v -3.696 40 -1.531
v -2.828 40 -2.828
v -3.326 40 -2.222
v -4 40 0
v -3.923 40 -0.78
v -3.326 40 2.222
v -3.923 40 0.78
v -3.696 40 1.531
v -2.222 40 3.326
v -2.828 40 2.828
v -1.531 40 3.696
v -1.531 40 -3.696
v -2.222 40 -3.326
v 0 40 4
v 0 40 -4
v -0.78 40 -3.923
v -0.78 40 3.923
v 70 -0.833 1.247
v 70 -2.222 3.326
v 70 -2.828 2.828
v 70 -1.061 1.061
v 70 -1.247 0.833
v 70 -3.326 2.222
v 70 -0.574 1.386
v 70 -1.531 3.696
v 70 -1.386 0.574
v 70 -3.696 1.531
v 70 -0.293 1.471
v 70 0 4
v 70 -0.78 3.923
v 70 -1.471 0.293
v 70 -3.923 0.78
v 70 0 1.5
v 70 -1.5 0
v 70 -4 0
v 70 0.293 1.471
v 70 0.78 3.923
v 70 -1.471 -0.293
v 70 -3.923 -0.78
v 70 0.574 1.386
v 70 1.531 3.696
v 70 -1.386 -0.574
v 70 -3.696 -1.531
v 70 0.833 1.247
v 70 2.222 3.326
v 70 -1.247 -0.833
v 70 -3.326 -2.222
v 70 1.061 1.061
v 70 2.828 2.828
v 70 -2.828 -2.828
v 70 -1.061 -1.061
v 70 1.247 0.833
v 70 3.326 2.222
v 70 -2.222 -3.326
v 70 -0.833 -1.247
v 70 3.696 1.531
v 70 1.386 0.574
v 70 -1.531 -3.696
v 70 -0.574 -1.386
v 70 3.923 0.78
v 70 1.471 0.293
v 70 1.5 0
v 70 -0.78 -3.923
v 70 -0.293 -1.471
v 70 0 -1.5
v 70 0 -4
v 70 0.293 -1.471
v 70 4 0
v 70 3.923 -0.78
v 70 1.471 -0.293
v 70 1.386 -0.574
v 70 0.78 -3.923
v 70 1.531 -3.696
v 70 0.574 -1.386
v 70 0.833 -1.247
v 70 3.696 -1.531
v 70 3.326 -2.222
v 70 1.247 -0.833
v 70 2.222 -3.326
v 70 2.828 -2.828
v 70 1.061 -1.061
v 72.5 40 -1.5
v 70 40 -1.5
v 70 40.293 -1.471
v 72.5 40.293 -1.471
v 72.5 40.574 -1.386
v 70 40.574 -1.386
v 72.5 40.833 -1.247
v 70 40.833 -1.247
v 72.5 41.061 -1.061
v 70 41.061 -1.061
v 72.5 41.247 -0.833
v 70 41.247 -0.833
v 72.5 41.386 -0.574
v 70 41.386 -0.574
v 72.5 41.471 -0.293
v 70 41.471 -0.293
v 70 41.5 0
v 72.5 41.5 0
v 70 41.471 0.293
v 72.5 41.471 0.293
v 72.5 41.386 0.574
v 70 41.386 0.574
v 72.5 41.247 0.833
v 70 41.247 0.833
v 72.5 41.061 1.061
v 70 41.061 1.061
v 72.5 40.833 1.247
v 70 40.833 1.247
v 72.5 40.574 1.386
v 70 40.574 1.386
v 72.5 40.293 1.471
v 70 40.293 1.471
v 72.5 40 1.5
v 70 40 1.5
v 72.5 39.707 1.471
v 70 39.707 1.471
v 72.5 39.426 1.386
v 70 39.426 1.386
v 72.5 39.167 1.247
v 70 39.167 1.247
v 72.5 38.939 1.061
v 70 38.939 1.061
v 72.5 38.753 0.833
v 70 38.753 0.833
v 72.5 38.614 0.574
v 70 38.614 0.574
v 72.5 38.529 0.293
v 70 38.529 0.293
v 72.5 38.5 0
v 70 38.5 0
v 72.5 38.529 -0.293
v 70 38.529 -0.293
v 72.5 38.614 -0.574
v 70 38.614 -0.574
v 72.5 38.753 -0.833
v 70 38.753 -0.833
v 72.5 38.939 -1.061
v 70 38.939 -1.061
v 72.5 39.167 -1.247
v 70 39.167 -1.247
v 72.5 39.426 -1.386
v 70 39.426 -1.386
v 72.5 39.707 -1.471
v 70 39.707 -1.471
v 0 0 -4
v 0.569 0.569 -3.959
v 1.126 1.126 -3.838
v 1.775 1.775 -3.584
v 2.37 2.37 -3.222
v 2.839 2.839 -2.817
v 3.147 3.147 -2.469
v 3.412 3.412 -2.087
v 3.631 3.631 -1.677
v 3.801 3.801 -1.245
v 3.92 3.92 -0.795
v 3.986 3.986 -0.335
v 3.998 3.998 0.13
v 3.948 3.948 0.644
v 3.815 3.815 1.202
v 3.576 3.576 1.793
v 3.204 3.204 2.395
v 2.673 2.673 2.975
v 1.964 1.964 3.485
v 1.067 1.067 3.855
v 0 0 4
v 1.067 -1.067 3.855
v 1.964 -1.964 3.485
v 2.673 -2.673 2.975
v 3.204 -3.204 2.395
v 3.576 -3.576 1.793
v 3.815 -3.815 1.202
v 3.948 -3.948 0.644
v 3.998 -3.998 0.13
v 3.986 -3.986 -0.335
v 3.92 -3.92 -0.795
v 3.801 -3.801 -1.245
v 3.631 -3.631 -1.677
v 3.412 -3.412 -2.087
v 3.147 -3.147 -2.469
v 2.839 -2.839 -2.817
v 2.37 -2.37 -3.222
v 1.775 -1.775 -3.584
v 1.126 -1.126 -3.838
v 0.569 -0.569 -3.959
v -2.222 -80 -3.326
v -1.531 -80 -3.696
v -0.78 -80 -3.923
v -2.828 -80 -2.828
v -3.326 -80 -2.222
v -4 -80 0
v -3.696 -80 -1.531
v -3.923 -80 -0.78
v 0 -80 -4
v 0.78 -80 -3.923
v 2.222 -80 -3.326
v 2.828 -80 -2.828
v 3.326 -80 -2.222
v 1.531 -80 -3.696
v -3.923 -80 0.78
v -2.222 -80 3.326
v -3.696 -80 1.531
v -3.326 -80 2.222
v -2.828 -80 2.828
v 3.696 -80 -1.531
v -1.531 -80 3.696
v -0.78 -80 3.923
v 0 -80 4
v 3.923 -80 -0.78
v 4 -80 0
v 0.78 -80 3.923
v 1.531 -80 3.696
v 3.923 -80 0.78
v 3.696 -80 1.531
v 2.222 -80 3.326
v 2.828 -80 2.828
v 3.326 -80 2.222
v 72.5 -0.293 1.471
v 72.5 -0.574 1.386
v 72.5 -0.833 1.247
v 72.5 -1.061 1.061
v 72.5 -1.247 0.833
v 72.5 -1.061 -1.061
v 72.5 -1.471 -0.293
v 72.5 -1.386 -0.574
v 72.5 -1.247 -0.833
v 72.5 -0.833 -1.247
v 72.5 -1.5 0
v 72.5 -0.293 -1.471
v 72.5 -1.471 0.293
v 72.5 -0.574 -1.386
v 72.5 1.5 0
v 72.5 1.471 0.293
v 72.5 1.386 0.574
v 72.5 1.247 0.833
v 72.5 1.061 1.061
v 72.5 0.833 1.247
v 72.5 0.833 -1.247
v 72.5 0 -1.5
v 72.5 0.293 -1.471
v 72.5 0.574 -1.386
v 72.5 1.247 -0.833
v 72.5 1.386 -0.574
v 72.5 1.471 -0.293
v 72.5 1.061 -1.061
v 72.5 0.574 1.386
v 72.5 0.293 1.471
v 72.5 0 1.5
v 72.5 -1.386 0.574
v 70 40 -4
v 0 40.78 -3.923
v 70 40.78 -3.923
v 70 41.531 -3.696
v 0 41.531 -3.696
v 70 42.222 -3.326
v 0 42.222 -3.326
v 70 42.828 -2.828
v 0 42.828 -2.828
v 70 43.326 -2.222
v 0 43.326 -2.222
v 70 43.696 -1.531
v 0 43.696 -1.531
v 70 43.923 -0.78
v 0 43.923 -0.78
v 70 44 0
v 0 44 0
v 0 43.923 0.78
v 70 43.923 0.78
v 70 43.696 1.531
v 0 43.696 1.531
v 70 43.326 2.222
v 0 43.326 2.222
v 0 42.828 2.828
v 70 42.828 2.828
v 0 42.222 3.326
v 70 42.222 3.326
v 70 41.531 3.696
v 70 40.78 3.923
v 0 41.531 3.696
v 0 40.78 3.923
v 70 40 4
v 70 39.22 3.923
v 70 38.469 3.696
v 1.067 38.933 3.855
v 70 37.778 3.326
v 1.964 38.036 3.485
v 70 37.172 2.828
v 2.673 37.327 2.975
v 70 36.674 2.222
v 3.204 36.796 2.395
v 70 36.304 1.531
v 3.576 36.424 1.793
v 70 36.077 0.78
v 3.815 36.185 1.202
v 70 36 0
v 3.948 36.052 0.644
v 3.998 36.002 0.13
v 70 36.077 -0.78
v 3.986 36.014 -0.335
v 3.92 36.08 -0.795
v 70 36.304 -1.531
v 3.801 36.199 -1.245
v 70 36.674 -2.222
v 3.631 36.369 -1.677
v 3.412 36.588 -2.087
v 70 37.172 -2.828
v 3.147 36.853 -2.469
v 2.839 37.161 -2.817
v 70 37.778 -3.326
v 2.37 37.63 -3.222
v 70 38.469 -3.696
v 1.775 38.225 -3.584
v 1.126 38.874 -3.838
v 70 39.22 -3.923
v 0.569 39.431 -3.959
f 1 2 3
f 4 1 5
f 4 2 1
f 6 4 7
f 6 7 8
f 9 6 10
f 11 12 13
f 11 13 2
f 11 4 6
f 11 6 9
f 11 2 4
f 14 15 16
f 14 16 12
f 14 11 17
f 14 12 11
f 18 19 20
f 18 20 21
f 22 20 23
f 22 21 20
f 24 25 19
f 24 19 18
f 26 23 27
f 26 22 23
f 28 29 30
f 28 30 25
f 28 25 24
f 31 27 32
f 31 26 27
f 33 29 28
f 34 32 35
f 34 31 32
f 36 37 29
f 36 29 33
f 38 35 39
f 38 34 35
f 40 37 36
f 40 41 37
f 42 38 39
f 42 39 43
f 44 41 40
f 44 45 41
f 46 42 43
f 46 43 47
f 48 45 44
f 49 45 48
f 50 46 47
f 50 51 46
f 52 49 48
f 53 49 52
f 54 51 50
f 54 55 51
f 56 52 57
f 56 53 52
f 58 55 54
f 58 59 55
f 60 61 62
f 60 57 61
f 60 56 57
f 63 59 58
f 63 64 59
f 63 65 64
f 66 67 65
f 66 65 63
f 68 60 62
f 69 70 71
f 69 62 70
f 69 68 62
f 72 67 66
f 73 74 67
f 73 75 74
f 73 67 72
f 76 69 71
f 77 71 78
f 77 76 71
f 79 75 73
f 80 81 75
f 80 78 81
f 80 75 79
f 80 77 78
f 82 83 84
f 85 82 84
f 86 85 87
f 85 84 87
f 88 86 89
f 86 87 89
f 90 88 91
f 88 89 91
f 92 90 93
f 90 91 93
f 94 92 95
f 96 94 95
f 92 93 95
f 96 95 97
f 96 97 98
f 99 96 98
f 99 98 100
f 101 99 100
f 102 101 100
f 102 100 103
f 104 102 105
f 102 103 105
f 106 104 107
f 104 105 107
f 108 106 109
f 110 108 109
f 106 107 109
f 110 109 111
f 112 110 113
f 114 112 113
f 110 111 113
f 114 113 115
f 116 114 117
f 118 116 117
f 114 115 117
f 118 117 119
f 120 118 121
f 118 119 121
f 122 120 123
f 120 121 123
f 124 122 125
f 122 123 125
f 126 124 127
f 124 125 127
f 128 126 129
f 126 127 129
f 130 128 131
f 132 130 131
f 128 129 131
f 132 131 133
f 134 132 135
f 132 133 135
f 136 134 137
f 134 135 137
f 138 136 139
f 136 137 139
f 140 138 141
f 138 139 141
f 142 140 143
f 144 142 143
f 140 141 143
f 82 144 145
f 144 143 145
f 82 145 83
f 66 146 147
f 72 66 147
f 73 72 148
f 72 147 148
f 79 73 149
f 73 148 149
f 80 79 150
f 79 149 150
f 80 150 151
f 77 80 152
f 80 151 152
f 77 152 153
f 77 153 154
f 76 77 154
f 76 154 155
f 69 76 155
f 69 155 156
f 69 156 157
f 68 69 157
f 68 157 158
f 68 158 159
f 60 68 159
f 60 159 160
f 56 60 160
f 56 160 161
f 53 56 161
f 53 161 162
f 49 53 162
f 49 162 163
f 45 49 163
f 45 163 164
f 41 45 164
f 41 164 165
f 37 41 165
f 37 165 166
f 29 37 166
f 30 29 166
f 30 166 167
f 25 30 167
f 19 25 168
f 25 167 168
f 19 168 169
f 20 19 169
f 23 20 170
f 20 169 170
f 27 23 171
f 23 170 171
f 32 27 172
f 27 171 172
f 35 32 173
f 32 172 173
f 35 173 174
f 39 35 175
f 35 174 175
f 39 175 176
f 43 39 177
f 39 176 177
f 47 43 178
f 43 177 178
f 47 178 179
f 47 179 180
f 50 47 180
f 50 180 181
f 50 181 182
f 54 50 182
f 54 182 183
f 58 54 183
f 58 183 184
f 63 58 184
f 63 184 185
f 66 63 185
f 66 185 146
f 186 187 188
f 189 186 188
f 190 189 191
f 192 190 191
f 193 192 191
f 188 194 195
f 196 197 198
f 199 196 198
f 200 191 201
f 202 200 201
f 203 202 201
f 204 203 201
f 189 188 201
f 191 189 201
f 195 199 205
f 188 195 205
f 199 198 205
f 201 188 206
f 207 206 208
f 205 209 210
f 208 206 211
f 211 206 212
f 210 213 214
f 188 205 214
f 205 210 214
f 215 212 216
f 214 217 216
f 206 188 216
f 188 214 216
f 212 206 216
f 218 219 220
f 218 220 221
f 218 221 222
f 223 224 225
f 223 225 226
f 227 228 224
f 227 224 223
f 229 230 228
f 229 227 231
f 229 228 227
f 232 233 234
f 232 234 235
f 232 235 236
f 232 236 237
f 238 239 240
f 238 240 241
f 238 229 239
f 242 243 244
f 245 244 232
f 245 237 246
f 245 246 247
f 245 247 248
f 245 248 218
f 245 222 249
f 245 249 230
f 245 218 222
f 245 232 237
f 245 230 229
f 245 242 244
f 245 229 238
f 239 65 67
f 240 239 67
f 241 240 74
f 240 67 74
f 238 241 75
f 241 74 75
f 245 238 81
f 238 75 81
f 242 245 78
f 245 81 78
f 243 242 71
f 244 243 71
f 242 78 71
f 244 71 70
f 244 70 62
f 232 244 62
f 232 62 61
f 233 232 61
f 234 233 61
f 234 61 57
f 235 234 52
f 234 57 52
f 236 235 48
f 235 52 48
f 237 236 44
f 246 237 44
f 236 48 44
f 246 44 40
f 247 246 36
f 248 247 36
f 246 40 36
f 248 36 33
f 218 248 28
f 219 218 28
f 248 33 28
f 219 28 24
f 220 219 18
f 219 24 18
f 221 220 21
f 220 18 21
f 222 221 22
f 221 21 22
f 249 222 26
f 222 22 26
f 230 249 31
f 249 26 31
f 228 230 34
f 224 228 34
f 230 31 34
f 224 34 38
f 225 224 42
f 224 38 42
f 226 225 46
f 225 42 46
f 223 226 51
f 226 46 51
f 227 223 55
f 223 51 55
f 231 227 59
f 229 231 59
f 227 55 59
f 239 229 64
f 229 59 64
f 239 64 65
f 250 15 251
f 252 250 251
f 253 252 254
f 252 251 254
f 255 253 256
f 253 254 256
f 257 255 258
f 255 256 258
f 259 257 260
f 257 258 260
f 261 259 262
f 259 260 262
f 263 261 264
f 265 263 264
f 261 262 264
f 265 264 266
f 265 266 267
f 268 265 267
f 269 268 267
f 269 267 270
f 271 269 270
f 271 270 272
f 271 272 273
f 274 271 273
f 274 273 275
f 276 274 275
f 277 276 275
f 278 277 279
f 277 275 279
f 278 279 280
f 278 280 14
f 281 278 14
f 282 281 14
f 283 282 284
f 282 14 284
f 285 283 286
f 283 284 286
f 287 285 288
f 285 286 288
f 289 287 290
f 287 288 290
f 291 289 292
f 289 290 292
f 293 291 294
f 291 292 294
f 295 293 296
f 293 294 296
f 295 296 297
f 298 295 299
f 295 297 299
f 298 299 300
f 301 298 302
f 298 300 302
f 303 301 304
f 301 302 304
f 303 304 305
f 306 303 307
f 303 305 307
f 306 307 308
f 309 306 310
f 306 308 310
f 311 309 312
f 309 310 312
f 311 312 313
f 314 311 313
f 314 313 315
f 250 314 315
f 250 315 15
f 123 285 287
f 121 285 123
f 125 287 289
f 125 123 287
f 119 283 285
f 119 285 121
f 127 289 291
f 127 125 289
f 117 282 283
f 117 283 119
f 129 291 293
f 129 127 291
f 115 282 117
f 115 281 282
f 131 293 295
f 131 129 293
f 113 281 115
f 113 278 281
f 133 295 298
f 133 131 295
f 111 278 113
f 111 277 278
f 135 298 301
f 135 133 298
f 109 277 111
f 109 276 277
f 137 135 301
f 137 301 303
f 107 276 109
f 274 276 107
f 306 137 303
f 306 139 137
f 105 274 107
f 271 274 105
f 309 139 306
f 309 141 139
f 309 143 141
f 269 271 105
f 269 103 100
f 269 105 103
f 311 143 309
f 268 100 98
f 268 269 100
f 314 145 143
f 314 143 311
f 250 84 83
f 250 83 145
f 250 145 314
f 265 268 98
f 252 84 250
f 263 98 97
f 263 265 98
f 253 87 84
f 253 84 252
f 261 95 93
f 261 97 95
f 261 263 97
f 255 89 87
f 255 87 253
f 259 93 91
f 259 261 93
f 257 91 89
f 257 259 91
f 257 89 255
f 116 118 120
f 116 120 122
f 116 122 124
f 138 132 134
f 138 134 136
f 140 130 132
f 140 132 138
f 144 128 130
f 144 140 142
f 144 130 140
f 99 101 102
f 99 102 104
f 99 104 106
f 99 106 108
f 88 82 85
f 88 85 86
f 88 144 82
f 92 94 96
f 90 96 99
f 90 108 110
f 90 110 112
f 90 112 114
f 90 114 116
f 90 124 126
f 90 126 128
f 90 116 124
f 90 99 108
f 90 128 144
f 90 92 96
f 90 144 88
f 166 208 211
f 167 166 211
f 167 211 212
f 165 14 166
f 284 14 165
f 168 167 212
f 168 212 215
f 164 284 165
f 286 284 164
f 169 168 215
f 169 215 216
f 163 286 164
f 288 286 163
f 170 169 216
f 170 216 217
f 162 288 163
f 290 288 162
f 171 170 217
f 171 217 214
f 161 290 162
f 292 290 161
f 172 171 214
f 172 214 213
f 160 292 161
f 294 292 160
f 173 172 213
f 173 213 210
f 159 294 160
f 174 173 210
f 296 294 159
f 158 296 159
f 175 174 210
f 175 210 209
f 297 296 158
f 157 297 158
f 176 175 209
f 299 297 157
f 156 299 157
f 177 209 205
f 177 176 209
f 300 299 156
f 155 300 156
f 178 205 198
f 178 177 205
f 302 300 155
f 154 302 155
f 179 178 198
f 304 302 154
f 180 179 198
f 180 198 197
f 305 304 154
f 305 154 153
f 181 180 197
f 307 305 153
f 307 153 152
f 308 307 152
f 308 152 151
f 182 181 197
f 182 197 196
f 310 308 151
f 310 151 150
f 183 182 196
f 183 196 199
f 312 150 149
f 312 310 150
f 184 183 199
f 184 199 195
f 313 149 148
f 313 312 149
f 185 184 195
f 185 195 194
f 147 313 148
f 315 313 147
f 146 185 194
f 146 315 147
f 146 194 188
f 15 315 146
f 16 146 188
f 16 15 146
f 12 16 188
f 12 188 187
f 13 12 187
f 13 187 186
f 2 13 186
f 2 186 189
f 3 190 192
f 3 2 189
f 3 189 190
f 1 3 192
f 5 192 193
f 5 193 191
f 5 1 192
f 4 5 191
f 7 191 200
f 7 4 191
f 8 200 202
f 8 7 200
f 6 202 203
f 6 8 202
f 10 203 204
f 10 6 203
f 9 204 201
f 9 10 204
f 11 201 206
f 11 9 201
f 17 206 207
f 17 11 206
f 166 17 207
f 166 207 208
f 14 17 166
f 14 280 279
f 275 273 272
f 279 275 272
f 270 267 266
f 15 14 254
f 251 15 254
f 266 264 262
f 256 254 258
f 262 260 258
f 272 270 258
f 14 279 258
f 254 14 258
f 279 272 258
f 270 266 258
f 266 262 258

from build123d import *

# Parameters (mm, degrees)
SKETCH1_R           = 4
BOSS_EXTRUDE1_DEPTH = 80
SKETCH3_R           = 4
BOSS_EXTRUDE3_DEPTH = 70
BOSS_EXTRUDE4_START = 40
SKETCH4_R           = 4
BOSS_EXTRUDE4_DEPTH = 40
SKETCH5_R           = 4
BOSS_EXTRUDE5_DEPTH = 70
SKETCH7_R           = 1.5
BOSS_EXTRUDE6_DEPTH = 2.5


with BuildPart() as part:
    # Sketch1 → Boss-Extrude1 (new body)
    with BuildSketch(Plane(origin=(0, 0, 0), x_dir=(1, 0, 0), z_dir=(0, 1, 0))):
        with Locations(Location((0, 0, 0), (0, 0, 270))):
            Circle(SKETCH1_R)
    extrude(amount=-BOSS_EXTRUDE1_DEPTH)

    # Sketch3 → Boss-Extrude3 (add)
    with BuildSketch(Plane(origin=(0, 0, 0), x_dir=(0, 0, -1), z_dir=(1, 0, 0))):
        Circle(SKETCH3_R)
    extrude(amount=BOSS_EXTRUDE3_DEPTH)

    # Sketch4 → Boss-Extrude4 (add)
    with BuildSketch(Plane(origin=(0, 0, 0), x_dir=(1, 0, 0), z_dir=(0, 1, 0)).offset(BOSS_EXTRUDE4_START)):
        with Locations(Location((0, 0, 0), (0, 0, 270))):
            Circle(SKETCH4_R)
    extrude(amount=-BOSS_EXTRUDE4_DEPTH)

    # Sketch5 → Boss-Extrude5 (add)
    with BuildSketch(Plane(origin=(0, 0, 0), x_dir=(0, 0, -1), z_dir=(1, 0, 0))):
        with Locations((0, 40)):
            Circle(SKETCH5_R)
    extrude(amount=BOSS_EXTRUDE5_DEPTH)

    # Sketch7 → Boss-Extrude6 (add)
    with BuildSketch(Plane(origin=(70, 0, 0), x_dir=(0, 0, -1), z_dir=(1, 0, 0))):
        with Locations((0, 40)):
            Circle(SKETCH7_R)
        Circle(SKETCH7_R)
    extrude(amount=BOSS_EXTRUDE6_DEPTH)


solid = part.part
